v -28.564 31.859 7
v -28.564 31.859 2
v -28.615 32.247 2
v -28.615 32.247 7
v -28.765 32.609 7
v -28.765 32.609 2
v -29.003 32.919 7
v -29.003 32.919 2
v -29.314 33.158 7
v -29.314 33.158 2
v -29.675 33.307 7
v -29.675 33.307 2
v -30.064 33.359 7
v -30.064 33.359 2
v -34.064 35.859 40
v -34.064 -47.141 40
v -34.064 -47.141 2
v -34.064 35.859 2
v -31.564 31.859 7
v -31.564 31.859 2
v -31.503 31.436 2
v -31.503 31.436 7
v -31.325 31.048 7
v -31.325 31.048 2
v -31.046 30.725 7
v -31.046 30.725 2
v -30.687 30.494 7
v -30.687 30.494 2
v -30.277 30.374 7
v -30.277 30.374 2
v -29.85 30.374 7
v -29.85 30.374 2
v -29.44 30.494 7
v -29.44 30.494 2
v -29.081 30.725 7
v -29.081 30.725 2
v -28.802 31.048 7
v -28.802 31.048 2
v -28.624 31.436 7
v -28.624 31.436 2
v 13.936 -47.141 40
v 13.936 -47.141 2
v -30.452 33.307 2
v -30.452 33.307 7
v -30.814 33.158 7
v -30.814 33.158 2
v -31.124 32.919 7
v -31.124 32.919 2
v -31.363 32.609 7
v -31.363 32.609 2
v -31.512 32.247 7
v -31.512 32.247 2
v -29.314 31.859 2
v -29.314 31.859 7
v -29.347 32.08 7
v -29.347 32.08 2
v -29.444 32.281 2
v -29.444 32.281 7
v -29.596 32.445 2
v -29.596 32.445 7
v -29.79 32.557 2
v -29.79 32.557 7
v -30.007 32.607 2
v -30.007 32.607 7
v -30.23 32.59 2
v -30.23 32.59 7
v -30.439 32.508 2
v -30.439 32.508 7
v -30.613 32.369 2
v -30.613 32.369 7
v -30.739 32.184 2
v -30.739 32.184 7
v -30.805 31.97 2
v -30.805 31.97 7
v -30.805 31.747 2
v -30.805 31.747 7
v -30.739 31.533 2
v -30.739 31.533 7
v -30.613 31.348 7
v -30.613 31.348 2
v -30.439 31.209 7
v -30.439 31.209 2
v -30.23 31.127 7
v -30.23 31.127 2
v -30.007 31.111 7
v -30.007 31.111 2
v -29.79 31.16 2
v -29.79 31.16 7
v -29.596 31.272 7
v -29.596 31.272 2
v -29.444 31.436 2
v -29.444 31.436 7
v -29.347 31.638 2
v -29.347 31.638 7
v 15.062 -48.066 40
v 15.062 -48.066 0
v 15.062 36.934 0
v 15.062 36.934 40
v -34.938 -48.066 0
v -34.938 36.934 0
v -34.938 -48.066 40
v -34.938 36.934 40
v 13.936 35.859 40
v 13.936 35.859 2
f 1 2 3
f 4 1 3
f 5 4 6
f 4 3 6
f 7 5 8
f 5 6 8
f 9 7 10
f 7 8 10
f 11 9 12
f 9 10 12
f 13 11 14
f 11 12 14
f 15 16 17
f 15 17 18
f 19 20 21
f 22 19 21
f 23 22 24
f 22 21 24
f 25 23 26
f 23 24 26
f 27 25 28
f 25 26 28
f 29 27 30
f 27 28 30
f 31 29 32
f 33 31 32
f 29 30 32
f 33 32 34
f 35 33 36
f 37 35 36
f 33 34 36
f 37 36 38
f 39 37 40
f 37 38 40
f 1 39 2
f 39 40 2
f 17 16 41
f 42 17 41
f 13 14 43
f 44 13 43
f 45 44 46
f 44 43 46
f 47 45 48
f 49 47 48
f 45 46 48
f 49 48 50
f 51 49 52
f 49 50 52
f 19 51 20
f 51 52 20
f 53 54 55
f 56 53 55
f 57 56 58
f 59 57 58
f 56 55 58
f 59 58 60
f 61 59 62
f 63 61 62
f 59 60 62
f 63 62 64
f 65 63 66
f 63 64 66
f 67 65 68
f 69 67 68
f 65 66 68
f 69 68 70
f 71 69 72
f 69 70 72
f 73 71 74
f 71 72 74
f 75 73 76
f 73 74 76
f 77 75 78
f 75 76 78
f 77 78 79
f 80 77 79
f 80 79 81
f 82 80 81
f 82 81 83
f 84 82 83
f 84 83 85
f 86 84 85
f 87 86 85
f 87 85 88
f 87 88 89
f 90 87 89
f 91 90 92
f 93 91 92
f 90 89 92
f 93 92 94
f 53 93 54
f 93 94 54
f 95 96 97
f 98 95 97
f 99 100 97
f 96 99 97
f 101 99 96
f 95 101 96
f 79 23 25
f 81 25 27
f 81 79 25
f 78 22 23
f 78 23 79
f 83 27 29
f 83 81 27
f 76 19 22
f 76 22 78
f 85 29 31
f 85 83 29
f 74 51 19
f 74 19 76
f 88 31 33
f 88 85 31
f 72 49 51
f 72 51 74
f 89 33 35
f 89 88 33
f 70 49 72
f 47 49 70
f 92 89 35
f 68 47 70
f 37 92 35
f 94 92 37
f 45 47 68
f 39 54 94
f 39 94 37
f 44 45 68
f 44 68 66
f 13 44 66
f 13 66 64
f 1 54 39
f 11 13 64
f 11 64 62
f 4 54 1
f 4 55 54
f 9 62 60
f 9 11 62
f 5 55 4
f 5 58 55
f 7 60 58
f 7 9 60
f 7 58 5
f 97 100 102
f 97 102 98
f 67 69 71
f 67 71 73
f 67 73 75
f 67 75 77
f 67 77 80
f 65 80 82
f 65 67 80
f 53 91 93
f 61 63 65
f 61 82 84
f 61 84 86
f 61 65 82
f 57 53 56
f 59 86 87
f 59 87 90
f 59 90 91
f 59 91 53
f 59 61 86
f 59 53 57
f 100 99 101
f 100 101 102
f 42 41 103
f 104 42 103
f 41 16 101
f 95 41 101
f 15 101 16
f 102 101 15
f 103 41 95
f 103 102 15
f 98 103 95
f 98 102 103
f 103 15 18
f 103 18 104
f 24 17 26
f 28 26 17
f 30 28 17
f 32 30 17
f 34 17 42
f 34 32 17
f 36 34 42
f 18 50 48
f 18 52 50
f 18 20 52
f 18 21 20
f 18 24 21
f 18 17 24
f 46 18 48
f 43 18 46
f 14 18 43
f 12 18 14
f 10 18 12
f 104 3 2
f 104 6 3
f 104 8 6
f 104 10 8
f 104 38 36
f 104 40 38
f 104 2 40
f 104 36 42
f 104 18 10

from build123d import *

# Parameters (mm, degrees)
F0_W     = 50
F0_H     = 85
F1_DEPTH = 40
F2_W     = 48
F2_H     = 83
F3_DEPTH = 38
F5_DEPTH = 5
F6_R     = 0.75
F7_DEPTH = 5


with BuildPart() as f1:
    # F0 (on Top) → F1 (new body)
    with BuildSketch(Plane.XY):
        with Locations((-9.93821384, -5.5663399398)):
            Rectangle(F0_W, F0_H)
    extrude(amount=F1_DEPTH)

    # F2 (on face) → F3 (cut)
    with BuildSketch(Plane.XY.offset(40)):
        with Locations((-10.0635439157, -5.6413925663)):
            Rectangle(F2_W, F2_H)
    extrude(amount=-F3_DEPTH, mode=Mode.SUBTRACT)

    # F4 (on face) → F5 (join)
    with BuildSketch(Plane.XY.offset(2)):
        with BuildLine():
            Line((-30.0635439157, 31.8586074337), (-30.0635439157, 33.3586074337))
            ThreePointArc((-30.0635439157, 33.3586074337), (-31.1242040875, 32.9192676054), (-31.5635439157, 31.8586074337))
            Line((-31.5635439157, 31.8586074337), (-30.0635439157, 31.8586074337))
        make_face()
        with BuildLine():
            ThreePointArc((-31.5635439157, 31.8586074337), (-30.0635439157, 30.3586074337), (-28.5635439157, 31.8586074337))
            ThreePointArc((-28.5635439157, 31.8586074337), (-29.002883744, 32.9192676054), (-30.0635439157, 33.3586074337))
            Line((-30.0635439157, 33.3586074337), (-30.0635439157, 31.8586074337))
            Line((-30.0635439157, 31.8586074337), (-31.5635439157, 31.8586074337))
        make_face()
    extrude(amount=F5_DEPTH)

    # F6 (on face) → F7 (cut)
    with BuildSketch(Plane.XY.offset(7)):
        with Locations((-30.0635439157, 31.8586074337)):
            Circle(F6_R)
    extrude(amount=-F7_DEPTH, mode=Mode.SUBTRACT)


solid = f1.part
